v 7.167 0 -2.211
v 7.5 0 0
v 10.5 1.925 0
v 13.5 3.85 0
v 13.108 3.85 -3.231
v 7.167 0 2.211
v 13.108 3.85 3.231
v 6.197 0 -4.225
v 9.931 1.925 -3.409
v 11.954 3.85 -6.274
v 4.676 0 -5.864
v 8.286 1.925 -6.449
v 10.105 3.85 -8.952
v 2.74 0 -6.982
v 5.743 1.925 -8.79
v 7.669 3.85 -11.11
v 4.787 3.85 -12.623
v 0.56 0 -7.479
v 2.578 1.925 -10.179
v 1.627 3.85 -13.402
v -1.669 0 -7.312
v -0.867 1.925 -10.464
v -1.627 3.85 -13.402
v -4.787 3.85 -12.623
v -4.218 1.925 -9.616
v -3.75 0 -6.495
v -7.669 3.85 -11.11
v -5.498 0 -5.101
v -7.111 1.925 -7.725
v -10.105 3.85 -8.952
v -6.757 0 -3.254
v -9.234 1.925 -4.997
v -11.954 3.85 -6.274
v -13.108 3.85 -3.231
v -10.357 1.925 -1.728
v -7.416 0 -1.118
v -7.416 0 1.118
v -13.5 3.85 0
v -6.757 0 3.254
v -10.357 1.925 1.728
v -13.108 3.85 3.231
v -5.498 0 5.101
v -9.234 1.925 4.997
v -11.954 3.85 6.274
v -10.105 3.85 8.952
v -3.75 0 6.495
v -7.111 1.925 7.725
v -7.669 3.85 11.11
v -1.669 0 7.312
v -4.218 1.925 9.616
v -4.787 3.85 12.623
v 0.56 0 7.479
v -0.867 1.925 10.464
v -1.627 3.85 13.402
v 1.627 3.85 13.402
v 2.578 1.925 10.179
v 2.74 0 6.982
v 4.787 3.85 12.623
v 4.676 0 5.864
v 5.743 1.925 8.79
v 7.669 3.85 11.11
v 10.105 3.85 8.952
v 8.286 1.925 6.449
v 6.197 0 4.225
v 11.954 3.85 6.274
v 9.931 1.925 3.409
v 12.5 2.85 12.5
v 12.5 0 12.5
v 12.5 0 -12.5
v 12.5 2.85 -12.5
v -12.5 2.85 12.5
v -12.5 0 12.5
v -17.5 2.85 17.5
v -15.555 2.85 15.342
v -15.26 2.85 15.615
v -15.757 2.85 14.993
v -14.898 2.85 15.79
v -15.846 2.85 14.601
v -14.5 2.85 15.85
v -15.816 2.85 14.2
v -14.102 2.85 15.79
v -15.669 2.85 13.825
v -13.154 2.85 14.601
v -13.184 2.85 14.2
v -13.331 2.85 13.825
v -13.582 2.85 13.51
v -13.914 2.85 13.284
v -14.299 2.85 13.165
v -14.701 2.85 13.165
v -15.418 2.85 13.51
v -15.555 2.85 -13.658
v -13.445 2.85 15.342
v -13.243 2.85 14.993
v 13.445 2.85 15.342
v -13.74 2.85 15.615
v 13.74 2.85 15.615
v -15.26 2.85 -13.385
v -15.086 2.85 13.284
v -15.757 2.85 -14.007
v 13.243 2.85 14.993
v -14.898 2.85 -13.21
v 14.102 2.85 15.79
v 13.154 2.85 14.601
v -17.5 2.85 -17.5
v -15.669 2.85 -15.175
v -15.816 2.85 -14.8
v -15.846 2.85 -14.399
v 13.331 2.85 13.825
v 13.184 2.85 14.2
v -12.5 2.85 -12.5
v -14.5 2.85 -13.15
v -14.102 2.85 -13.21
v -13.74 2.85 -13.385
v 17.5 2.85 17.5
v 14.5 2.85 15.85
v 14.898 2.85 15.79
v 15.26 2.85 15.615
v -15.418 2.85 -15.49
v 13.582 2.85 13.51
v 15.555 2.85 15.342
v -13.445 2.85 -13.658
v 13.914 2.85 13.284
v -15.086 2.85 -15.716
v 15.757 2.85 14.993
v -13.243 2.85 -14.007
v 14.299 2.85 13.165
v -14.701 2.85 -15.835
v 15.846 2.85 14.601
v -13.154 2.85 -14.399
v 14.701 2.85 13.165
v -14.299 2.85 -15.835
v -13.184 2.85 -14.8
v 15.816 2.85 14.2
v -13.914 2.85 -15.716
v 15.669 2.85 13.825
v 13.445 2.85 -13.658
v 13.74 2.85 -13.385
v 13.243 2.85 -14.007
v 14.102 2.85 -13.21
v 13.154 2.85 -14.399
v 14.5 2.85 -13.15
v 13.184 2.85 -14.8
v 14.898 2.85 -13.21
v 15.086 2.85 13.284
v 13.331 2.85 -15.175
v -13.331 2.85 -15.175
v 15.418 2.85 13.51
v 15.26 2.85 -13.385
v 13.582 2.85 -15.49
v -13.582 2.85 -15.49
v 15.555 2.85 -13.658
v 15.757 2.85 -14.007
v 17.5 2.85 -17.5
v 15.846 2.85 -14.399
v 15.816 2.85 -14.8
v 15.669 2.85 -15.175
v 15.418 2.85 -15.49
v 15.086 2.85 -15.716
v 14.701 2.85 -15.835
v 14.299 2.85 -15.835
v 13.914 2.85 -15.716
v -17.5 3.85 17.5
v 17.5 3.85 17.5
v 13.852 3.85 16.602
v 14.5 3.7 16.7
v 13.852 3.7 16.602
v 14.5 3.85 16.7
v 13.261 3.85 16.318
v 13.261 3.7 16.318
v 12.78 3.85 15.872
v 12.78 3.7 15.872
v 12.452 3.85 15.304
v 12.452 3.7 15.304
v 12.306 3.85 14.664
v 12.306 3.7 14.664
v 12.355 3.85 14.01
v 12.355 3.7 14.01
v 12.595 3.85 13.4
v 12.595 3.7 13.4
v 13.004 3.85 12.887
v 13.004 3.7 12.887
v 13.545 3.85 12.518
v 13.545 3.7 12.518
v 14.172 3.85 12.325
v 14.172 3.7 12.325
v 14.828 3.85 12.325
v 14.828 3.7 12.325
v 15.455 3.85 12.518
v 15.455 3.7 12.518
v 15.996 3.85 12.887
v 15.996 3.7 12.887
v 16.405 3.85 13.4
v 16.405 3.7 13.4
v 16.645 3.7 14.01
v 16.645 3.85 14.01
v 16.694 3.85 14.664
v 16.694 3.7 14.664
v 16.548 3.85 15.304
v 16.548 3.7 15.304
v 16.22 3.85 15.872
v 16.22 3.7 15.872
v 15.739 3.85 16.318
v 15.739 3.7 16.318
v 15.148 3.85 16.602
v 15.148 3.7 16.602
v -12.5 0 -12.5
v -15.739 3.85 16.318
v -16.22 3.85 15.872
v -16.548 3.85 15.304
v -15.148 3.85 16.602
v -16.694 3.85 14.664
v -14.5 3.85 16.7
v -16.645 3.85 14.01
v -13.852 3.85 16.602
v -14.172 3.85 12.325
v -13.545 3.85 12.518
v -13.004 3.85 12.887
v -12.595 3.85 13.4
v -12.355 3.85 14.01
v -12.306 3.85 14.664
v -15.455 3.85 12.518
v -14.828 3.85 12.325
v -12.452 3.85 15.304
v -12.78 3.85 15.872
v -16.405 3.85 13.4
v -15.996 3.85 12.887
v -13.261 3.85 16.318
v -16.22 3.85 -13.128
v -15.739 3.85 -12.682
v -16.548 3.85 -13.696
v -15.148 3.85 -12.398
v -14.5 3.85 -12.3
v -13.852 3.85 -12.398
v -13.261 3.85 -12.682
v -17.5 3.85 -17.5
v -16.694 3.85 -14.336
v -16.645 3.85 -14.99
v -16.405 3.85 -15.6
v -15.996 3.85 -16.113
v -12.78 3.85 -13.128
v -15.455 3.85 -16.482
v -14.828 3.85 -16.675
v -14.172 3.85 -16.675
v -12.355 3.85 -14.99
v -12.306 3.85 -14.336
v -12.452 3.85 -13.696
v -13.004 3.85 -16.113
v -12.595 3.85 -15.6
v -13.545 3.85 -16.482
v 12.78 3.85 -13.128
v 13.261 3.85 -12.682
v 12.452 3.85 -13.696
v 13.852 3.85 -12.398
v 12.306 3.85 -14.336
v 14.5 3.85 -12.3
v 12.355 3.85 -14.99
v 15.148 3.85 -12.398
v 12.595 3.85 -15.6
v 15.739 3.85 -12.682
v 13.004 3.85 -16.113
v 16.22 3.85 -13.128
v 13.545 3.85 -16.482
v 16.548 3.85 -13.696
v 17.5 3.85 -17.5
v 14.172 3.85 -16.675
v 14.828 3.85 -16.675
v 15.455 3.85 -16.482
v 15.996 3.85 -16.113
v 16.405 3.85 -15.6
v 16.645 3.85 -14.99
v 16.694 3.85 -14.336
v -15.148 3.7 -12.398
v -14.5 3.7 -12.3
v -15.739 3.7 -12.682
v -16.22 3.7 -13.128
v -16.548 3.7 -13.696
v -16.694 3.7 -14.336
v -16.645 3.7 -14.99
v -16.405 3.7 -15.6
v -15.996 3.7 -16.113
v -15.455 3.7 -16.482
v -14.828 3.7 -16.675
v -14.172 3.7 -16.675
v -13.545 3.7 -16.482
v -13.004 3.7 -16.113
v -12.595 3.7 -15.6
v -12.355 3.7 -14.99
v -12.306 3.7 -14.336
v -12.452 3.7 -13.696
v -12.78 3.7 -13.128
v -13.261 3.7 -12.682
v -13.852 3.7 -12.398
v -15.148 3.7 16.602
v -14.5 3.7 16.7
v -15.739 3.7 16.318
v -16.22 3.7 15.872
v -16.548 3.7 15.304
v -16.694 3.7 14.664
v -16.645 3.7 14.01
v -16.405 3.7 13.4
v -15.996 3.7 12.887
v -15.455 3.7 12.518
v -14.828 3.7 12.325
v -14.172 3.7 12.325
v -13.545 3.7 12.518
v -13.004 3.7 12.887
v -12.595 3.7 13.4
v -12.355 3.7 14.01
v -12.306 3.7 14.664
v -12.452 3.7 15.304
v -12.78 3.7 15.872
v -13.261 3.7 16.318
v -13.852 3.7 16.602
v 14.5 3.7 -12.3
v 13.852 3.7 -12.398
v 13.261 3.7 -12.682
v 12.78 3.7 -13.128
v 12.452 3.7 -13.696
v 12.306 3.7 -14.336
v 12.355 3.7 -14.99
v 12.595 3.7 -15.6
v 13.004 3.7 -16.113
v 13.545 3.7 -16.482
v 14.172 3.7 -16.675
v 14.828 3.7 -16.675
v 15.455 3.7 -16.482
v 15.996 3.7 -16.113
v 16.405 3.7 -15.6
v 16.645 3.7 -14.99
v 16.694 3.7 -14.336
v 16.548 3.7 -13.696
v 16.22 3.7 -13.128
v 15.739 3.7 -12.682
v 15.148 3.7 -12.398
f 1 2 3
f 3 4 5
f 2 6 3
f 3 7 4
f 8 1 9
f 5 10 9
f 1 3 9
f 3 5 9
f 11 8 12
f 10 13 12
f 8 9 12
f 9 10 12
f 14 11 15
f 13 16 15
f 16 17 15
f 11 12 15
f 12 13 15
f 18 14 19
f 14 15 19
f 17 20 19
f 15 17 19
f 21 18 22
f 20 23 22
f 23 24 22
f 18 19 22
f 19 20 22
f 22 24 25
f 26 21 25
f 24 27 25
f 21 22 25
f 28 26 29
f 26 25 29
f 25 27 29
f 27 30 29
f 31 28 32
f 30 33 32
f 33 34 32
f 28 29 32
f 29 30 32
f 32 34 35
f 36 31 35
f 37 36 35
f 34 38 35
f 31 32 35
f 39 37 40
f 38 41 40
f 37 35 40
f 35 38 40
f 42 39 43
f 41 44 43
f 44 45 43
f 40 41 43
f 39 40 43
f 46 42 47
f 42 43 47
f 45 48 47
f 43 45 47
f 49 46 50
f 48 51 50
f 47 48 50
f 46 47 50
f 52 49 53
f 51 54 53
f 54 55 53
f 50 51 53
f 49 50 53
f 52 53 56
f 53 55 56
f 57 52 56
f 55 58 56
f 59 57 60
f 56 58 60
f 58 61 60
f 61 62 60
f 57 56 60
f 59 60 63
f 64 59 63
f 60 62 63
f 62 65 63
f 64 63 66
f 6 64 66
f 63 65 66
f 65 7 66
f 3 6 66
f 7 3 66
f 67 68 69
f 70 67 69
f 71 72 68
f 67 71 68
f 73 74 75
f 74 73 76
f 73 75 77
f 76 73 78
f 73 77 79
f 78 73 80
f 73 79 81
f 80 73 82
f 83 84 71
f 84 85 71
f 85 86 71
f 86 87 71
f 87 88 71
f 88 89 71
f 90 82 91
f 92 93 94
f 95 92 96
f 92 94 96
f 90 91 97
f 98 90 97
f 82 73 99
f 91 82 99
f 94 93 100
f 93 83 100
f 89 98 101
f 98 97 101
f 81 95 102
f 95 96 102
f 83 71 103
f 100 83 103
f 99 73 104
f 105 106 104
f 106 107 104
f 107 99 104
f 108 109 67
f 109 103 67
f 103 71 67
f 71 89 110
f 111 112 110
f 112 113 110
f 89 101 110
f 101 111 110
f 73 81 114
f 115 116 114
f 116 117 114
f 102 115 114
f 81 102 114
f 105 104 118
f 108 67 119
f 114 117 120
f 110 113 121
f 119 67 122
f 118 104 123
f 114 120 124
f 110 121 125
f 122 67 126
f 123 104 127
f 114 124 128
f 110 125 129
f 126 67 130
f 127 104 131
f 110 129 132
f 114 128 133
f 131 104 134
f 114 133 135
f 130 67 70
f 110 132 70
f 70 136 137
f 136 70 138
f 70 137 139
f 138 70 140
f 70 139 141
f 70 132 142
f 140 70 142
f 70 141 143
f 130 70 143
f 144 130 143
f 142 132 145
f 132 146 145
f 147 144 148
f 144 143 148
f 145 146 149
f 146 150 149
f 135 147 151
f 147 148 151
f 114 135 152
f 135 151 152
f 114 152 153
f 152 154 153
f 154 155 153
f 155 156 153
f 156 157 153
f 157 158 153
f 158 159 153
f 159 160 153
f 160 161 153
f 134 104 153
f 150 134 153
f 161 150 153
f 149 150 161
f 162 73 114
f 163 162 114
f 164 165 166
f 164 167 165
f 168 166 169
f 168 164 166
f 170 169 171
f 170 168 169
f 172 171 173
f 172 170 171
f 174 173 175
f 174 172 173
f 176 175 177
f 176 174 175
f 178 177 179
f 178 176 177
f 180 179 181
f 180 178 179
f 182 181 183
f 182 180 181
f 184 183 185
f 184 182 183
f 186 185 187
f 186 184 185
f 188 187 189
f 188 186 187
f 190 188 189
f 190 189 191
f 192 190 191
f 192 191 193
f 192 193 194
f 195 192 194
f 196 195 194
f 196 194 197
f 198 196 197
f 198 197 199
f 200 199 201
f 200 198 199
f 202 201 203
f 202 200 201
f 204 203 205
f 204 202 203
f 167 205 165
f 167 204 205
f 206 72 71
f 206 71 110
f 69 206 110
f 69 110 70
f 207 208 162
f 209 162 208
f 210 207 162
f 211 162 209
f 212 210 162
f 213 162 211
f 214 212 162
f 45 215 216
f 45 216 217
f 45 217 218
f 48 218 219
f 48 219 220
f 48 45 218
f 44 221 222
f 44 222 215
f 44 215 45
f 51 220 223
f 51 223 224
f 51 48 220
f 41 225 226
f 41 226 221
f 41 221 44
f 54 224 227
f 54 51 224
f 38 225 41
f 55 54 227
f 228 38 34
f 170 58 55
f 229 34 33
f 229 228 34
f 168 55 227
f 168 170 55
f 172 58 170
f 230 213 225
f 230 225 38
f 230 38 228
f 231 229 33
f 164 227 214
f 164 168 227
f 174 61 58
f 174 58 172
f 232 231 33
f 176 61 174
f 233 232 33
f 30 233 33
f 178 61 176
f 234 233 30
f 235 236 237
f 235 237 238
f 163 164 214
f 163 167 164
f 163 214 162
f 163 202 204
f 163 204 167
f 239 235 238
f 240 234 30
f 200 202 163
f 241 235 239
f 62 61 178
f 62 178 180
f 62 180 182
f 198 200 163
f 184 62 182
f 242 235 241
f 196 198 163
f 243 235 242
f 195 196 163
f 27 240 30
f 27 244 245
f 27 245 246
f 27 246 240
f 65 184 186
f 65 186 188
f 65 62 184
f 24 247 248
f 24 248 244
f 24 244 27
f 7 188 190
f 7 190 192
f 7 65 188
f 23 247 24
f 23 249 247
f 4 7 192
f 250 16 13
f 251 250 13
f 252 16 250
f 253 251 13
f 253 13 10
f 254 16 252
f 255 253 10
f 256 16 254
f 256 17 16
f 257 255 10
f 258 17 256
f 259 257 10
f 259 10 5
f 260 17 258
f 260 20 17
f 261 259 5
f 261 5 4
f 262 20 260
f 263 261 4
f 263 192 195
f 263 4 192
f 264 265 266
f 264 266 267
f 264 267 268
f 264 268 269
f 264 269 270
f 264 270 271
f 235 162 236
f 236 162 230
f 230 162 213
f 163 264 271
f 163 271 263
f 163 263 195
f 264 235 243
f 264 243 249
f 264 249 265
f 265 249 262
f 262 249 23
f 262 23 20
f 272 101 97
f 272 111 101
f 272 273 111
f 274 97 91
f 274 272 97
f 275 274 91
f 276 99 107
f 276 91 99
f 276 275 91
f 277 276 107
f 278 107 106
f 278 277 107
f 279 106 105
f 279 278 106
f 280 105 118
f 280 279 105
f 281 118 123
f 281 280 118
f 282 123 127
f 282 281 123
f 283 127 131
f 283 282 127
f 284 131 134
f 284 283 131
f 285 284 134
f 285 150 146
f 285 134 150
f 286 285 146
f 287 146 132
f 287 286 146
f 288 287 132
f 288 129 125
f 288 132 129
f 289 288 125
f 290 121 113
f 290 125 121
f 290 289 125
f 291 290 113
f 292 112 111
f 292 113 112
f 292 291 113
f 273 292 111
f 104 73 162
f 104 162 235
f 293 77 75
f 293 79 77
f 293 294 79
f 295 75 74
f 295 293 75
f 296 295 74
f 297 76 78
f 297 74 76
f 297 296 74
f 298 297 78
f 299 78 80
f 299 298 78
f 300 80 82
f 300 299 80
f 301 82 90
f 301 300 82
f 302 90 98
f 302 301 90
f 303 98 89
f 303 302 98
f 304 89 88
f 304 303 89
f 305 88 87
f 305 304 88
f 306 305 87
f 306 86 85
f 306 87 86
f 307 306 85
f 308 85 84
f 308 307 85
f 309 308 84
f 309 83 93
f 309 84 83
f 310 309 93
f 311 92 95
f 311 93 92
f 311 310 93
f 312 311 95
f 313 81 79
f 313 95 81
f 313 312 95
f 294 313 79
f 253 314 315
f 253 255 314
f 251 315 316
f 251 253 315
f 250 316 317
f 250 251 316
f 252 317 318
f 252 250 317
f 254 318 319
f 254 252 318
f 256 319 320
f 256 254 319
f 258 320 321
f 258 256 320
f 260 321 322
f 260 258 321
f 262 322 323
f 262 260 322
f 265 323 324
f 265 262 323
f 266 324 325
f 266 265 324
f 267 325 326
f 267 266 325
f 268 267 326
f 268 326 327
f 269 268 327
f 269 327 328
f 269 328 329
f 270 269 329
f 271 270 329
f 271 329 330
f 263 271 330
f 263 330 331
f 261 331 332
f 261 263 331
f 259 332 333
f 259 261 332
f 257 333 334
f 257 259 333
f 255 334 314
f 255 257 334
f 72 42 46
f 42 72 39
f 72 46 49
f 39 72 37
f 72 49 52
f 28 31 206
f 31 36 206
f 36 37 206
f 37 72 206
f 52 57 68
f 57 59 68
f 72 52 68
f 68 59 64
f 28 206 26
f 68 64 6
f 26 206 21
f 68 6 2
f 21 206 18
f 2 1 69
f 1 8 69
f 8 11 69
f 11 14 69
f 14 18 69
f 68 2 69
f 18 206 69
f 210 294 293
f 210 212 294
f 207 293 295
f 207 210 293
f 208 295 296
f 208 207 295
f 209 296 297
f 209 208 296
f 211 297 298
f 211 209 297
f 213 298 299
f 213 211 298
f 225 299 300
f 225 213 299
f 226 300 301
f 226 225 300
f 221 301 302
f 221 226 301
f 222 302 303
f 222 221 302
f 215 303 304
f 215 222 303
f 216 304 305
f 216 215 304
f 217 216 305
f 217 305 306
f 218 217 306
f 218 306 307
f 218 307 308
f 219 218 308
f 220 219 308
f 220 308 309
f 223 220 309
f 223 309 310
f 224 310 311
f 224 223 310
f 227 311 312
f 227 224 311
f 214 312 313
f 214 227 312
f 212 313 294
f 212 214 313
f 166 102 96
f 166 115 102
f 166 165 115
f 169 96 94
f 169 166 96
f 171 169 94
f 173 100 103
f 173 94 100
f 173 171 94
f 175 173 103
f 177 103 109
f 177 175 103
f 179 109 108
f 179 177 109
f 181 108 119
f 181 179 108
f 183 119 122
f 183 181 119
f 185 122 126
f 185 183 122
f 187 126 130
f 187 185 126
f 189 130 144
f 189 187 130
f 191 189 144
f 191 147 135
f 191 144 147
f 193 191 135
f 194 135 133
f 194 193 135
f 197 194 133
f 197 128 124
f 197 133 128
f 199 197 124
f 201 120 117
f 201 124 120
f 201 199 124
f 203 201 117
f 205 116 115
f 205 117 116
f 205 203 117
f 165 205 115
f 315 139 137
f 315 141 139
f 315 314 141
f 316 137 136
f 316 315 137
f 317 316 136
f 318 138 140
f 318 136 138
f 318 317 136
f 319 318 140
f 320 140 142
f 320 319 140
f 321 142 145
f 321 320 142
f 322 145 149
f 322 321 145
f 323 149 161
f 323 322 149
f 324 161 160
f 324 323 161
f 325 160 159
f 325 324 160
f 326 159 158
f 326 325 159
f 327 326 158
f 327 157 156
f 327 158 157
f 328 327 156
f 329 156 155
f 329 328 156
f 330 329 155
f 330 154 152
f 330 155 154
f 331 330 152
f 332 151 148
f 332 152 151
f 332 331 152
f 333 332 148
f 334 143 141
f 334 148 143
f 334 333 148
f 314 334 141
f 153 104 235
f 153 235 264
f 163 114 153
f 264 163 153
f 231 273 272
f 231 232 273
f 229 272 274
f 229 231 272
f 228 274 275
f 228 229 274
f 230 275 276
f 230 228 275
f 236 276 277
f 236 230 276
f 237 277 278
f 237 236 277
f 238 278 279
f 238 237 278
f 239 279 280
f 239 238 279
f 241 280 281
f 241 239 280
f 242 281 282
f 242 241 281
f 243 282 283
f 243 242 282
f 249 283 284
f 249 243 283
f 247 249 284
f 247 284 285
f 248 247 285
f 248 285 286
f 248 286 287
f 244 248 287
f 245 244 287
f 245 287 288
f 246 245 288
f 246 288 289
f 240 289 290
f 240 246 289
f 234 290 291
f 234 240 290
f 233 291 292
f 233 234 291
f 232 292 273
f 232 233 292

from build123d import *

# Parameters (mm, degrees)
SKETCH1_W                                      = 25
SKETCH1_H                                      = 25
BOSS_EXTRUDE1_DEPTH                            = 2.85
SKETCH2_W                                      = 35
SKETCH2_H                                      = 35
BOSS_EXTRUDE2_DEPTH                            = 1
CSK_FOR_M2_FLAT_HEAD_MACHINE_SCREW1_AT_2_COUNT = 2
CSK_FOR_M2_FLAT_HEAD_MACHINE_SCREW1_AT_2_PITCH = 29
CSK_FOR_M2_FLAT_HEAD_MACHINE_SCREW1_AT_3_COUNT = 2
CSK_FOR_M2_FLAT_HEAD_MACHINE_SCREW1_AT_3_PITCH = 41.012193309
CSK_FOR_M2_FLAT_HEAD_MACHINE_SCREW1_AT_4_COUNT = 2
CSK_FOR_M2_FLAT_HEAD_MACHINE_SCREW1_AT_4_PITCH = 29


with BuildPart() as part:
    # Sketch1 → Boss-Extrude1 (new body)
    with BuildSketch(Plane(origin=(0, 0, 0), x_dir=(1, 0, 0), z_dir=(0, 1, 0))):
        Rectangle(SKETCH1_W, SKETCH1_H)
    extrude(amount=BOSS_EXTRUDE1_DEPTH)

    # Sketch2 → Boss-Extrude2 (add)
    with BuildSketch(Plane(origin=(0, 2.85, 0), x_dir=(1, 0, 0), z_dir=(0, 1, 0))):
        Rectangle(SKETCH2_W, SKETCH2_H)
    extrude(amount=BOSS_EXTRUDE2_DEPTH)

    # Sketch3 → Cut-Revolve1 (revolve, cut)
    with BuildSketch(Plane.XY):
        Polygon((0, 0), (7.5, 0), (13.5, 3.85), (0, 3.85), align=None)
    revolve(axis=Axis((0, 0, 0), (0, 1, 0)), mode=Mode.SUBTRACT)

    # Sketch4 → CSK for M2 Flat Head Machine Screw1 (revolve, cut)
    with BuildSketch(Plane(origin=(-14.5, 3.85, -14.5), x_dir=(0, 0, 1), z_dir=(1, 0, 0))):
        Polygon((0, 0), (0, 10.721032743), (1.2, 10), (1.2, 1.15), (2.2, 0.15), (2.2, 0), align=None)
    csk_for_m2_flat_head_machine_screw1 = revolve(axis=Axis((-14.5, 10.2, -14.5), (0, -1, 0)), mode=Mode.SUBTRACT)

    # CSK for M2 Flat Head Machine Screw1 at 2: CSK for M2 Flat Head Machine Screw1 ×2
    with Locations(*[(i * CSK_FOR_M2_FLAT_HEAD_MACHINE_SCREW1_AT_2_PITCH, 0, 0) for i in range(1, CSK_FOR_M2_FLAT_HEAD_MACHINE_SCREW1_AT_2_COUNT)]):
        add(csk_for_m2_flat_head_machine_screw1, mode=Mode.SUBTRACT)

    # CSK for M2 Flat Head Machine Screw1 at 3: CSK for M2 Flat Head Machine Screw1 ×2
    with Locations(*[Vector(0.707106781, 0, 0.707106781) * (i * CSK_FOR_M2_FLAT_HEAD_MACHINE_SCREW1_AT_3_PITCH) for i in range(1, CSK_FOR_M2_FLAT_HEAD_MACHINE_SCREW1_AT_3_COUNT)]):
        add(csk_for_m2_flat_head_machine_screw1, mode=Mode.SUBTRACT)

    # CSK for M2 Flat Head Machine Screw1 at 4: CSK for M2 Flat Head Machine Screw1 ×2
    with Locations(*[(0, 0, i * CSK_FOR_M2_FLAT_HEAD_MACHINE_SCREW1_AT_4_PITCH) for i in range(1, CSK_FOR_M2_FLAT_HEAD_MACHINE_SCREW1_AT_4_COUNT)]):
        add(csk_for_m2_flat_head_machine_screw1, mode=Mode.SUBTRACT)


solid = part.part
